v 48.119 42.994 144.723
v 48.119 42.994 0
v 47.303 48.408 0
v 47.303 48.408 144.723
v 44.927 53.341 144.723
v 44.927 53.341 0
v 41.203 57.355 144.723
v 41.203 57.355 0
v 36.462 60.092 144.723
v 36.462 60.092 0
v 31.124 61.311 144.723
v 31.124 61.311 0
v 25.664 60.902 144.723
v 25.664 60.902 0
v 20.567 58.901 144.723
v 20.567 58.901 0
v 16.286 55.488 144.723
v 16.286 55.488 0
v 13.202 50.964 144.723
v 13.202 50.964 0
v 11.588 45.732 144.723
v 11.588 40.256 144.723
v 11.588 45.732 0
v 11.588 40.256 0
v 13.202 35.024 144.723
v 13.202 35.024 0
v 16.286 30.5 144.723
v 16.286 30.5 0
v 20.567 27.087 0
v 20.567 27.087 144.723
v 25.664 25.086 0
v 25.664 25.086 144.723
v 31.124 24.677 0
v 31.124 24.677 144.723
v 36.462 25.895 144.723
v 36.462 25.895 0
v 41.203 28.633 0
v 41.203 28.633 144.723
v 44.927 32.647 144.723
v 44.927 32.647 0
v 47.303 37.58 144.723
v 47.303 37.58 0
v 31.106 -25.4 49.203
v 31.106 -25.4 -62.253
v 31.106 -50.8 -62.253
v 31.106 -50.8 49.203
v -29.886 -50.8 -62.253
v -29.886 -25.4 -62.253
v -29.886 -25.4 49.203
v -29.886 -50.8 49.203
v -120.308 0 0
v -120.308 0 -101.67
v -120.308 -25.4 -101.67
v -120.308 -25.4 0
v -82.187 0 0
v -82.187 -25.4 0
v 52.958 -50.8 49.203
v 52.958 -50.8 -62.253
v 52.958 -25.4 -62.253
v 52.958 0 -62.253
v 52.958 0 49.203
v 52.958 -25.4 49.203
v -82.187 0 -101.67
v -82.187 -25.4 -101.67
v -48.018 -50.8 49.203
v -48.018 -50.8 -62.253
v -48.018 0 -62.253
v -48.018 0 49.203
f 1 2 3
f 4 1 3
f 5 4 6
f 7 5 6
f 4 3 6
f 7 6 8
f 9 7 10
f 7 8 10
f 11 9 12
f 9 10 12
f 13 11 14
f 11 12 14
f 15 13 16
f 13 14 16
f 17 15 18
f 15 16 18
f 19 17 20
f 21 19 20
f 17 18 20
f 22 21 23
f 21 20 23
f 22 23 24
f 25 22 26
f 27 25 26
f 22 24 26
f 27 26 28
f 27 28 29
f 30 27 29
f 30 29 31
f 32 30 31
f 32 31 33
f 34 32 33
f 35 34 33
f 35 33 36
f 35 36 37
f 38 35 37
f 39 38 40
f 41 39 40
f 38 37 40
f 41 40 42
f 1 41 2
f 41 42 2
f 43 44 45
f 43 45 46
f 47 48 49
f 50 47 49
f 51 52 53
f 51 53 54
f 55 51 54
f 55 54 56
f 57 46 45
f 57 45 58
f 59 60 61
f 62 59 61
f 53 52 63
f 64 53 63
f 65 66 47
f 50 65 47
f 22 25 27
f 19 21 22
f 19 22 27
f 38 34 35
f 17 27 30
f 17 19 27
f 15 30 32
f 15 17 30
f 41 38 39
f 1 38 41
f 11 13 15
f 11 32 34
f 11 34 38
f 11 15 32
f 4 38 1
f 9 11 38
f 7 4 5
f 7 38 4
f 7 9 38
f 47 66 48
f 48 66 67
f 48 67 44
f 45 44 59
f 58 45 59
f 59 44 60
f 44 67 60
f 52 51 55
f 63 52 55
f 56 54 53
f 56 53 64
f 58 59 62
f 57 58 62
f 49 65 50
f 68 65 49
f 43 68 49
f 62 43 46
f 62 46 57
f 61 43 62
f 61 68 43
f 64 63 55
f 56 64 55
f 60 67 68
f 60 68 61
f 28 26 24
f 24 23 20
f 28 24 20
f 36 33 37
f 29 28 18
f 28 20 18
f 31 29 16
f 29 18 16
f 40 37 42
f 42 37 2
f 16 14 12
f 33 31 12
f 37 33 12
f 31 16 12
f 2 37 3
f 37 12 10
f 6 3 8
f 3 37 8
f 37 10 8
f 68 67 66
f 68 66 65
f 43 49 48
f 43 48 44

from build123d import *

# Parameters (mm, degrees)
F0_W     = 100.976043
F0_H     = 111.456186
F1_DEPTH = 25.4
F2_W     = 38.12021
F2_H     = 101.669848
F3_DEPTH = 25.4
F4_W     = 21.851093
F4_H     = 111.456186
F4_W_2   = 18.132247
F5_DEPTH = 25.4
F6_R     = 18.368269
F7_DEPTH = 144.72338


with BuildPart() as f1:
    # F0 (on Front) → F1 (new body)
    with BuildSketch(Plane.XZ):
        with Locations((2.469528, -6.524831)):
            Rectangle(F0_W, F0_H)
    extrude(amount=F1_DEPTH)

    # F4 (on face) → F5 (join)
    with BuildSketch(Plane.XZ.offset(25.4)):
        with Locations((42.032004, -6.524831)):
            Rectangle(F4_W, F4_H)
        with Locations((-38.95237, -6.524831)):
            Rectangle(F4_W_2, F4_H)
    extrude(amount=F5_DEPTH)


with BuildPart() as f3:
    # F2 (on Front) → F3 (new body)
    with BuildSketch(Plane.XZ):
        with Locations((-101.247504, -50.834924)):
            Rectangle(F2_W, F2_H)
    extrude(amount=F3_DEPTH)


with BuildPart() as f7:
    # F6 (on Top) → F7 (new body)
    with BuildSketch(Plane.XY):
        with Locations((29.750854, 42.993948)):
            Circle(F6_R)
    extrude(amount=F7_DEPTH)


solid = Compound([f1.part, f3.part, f7.part])
